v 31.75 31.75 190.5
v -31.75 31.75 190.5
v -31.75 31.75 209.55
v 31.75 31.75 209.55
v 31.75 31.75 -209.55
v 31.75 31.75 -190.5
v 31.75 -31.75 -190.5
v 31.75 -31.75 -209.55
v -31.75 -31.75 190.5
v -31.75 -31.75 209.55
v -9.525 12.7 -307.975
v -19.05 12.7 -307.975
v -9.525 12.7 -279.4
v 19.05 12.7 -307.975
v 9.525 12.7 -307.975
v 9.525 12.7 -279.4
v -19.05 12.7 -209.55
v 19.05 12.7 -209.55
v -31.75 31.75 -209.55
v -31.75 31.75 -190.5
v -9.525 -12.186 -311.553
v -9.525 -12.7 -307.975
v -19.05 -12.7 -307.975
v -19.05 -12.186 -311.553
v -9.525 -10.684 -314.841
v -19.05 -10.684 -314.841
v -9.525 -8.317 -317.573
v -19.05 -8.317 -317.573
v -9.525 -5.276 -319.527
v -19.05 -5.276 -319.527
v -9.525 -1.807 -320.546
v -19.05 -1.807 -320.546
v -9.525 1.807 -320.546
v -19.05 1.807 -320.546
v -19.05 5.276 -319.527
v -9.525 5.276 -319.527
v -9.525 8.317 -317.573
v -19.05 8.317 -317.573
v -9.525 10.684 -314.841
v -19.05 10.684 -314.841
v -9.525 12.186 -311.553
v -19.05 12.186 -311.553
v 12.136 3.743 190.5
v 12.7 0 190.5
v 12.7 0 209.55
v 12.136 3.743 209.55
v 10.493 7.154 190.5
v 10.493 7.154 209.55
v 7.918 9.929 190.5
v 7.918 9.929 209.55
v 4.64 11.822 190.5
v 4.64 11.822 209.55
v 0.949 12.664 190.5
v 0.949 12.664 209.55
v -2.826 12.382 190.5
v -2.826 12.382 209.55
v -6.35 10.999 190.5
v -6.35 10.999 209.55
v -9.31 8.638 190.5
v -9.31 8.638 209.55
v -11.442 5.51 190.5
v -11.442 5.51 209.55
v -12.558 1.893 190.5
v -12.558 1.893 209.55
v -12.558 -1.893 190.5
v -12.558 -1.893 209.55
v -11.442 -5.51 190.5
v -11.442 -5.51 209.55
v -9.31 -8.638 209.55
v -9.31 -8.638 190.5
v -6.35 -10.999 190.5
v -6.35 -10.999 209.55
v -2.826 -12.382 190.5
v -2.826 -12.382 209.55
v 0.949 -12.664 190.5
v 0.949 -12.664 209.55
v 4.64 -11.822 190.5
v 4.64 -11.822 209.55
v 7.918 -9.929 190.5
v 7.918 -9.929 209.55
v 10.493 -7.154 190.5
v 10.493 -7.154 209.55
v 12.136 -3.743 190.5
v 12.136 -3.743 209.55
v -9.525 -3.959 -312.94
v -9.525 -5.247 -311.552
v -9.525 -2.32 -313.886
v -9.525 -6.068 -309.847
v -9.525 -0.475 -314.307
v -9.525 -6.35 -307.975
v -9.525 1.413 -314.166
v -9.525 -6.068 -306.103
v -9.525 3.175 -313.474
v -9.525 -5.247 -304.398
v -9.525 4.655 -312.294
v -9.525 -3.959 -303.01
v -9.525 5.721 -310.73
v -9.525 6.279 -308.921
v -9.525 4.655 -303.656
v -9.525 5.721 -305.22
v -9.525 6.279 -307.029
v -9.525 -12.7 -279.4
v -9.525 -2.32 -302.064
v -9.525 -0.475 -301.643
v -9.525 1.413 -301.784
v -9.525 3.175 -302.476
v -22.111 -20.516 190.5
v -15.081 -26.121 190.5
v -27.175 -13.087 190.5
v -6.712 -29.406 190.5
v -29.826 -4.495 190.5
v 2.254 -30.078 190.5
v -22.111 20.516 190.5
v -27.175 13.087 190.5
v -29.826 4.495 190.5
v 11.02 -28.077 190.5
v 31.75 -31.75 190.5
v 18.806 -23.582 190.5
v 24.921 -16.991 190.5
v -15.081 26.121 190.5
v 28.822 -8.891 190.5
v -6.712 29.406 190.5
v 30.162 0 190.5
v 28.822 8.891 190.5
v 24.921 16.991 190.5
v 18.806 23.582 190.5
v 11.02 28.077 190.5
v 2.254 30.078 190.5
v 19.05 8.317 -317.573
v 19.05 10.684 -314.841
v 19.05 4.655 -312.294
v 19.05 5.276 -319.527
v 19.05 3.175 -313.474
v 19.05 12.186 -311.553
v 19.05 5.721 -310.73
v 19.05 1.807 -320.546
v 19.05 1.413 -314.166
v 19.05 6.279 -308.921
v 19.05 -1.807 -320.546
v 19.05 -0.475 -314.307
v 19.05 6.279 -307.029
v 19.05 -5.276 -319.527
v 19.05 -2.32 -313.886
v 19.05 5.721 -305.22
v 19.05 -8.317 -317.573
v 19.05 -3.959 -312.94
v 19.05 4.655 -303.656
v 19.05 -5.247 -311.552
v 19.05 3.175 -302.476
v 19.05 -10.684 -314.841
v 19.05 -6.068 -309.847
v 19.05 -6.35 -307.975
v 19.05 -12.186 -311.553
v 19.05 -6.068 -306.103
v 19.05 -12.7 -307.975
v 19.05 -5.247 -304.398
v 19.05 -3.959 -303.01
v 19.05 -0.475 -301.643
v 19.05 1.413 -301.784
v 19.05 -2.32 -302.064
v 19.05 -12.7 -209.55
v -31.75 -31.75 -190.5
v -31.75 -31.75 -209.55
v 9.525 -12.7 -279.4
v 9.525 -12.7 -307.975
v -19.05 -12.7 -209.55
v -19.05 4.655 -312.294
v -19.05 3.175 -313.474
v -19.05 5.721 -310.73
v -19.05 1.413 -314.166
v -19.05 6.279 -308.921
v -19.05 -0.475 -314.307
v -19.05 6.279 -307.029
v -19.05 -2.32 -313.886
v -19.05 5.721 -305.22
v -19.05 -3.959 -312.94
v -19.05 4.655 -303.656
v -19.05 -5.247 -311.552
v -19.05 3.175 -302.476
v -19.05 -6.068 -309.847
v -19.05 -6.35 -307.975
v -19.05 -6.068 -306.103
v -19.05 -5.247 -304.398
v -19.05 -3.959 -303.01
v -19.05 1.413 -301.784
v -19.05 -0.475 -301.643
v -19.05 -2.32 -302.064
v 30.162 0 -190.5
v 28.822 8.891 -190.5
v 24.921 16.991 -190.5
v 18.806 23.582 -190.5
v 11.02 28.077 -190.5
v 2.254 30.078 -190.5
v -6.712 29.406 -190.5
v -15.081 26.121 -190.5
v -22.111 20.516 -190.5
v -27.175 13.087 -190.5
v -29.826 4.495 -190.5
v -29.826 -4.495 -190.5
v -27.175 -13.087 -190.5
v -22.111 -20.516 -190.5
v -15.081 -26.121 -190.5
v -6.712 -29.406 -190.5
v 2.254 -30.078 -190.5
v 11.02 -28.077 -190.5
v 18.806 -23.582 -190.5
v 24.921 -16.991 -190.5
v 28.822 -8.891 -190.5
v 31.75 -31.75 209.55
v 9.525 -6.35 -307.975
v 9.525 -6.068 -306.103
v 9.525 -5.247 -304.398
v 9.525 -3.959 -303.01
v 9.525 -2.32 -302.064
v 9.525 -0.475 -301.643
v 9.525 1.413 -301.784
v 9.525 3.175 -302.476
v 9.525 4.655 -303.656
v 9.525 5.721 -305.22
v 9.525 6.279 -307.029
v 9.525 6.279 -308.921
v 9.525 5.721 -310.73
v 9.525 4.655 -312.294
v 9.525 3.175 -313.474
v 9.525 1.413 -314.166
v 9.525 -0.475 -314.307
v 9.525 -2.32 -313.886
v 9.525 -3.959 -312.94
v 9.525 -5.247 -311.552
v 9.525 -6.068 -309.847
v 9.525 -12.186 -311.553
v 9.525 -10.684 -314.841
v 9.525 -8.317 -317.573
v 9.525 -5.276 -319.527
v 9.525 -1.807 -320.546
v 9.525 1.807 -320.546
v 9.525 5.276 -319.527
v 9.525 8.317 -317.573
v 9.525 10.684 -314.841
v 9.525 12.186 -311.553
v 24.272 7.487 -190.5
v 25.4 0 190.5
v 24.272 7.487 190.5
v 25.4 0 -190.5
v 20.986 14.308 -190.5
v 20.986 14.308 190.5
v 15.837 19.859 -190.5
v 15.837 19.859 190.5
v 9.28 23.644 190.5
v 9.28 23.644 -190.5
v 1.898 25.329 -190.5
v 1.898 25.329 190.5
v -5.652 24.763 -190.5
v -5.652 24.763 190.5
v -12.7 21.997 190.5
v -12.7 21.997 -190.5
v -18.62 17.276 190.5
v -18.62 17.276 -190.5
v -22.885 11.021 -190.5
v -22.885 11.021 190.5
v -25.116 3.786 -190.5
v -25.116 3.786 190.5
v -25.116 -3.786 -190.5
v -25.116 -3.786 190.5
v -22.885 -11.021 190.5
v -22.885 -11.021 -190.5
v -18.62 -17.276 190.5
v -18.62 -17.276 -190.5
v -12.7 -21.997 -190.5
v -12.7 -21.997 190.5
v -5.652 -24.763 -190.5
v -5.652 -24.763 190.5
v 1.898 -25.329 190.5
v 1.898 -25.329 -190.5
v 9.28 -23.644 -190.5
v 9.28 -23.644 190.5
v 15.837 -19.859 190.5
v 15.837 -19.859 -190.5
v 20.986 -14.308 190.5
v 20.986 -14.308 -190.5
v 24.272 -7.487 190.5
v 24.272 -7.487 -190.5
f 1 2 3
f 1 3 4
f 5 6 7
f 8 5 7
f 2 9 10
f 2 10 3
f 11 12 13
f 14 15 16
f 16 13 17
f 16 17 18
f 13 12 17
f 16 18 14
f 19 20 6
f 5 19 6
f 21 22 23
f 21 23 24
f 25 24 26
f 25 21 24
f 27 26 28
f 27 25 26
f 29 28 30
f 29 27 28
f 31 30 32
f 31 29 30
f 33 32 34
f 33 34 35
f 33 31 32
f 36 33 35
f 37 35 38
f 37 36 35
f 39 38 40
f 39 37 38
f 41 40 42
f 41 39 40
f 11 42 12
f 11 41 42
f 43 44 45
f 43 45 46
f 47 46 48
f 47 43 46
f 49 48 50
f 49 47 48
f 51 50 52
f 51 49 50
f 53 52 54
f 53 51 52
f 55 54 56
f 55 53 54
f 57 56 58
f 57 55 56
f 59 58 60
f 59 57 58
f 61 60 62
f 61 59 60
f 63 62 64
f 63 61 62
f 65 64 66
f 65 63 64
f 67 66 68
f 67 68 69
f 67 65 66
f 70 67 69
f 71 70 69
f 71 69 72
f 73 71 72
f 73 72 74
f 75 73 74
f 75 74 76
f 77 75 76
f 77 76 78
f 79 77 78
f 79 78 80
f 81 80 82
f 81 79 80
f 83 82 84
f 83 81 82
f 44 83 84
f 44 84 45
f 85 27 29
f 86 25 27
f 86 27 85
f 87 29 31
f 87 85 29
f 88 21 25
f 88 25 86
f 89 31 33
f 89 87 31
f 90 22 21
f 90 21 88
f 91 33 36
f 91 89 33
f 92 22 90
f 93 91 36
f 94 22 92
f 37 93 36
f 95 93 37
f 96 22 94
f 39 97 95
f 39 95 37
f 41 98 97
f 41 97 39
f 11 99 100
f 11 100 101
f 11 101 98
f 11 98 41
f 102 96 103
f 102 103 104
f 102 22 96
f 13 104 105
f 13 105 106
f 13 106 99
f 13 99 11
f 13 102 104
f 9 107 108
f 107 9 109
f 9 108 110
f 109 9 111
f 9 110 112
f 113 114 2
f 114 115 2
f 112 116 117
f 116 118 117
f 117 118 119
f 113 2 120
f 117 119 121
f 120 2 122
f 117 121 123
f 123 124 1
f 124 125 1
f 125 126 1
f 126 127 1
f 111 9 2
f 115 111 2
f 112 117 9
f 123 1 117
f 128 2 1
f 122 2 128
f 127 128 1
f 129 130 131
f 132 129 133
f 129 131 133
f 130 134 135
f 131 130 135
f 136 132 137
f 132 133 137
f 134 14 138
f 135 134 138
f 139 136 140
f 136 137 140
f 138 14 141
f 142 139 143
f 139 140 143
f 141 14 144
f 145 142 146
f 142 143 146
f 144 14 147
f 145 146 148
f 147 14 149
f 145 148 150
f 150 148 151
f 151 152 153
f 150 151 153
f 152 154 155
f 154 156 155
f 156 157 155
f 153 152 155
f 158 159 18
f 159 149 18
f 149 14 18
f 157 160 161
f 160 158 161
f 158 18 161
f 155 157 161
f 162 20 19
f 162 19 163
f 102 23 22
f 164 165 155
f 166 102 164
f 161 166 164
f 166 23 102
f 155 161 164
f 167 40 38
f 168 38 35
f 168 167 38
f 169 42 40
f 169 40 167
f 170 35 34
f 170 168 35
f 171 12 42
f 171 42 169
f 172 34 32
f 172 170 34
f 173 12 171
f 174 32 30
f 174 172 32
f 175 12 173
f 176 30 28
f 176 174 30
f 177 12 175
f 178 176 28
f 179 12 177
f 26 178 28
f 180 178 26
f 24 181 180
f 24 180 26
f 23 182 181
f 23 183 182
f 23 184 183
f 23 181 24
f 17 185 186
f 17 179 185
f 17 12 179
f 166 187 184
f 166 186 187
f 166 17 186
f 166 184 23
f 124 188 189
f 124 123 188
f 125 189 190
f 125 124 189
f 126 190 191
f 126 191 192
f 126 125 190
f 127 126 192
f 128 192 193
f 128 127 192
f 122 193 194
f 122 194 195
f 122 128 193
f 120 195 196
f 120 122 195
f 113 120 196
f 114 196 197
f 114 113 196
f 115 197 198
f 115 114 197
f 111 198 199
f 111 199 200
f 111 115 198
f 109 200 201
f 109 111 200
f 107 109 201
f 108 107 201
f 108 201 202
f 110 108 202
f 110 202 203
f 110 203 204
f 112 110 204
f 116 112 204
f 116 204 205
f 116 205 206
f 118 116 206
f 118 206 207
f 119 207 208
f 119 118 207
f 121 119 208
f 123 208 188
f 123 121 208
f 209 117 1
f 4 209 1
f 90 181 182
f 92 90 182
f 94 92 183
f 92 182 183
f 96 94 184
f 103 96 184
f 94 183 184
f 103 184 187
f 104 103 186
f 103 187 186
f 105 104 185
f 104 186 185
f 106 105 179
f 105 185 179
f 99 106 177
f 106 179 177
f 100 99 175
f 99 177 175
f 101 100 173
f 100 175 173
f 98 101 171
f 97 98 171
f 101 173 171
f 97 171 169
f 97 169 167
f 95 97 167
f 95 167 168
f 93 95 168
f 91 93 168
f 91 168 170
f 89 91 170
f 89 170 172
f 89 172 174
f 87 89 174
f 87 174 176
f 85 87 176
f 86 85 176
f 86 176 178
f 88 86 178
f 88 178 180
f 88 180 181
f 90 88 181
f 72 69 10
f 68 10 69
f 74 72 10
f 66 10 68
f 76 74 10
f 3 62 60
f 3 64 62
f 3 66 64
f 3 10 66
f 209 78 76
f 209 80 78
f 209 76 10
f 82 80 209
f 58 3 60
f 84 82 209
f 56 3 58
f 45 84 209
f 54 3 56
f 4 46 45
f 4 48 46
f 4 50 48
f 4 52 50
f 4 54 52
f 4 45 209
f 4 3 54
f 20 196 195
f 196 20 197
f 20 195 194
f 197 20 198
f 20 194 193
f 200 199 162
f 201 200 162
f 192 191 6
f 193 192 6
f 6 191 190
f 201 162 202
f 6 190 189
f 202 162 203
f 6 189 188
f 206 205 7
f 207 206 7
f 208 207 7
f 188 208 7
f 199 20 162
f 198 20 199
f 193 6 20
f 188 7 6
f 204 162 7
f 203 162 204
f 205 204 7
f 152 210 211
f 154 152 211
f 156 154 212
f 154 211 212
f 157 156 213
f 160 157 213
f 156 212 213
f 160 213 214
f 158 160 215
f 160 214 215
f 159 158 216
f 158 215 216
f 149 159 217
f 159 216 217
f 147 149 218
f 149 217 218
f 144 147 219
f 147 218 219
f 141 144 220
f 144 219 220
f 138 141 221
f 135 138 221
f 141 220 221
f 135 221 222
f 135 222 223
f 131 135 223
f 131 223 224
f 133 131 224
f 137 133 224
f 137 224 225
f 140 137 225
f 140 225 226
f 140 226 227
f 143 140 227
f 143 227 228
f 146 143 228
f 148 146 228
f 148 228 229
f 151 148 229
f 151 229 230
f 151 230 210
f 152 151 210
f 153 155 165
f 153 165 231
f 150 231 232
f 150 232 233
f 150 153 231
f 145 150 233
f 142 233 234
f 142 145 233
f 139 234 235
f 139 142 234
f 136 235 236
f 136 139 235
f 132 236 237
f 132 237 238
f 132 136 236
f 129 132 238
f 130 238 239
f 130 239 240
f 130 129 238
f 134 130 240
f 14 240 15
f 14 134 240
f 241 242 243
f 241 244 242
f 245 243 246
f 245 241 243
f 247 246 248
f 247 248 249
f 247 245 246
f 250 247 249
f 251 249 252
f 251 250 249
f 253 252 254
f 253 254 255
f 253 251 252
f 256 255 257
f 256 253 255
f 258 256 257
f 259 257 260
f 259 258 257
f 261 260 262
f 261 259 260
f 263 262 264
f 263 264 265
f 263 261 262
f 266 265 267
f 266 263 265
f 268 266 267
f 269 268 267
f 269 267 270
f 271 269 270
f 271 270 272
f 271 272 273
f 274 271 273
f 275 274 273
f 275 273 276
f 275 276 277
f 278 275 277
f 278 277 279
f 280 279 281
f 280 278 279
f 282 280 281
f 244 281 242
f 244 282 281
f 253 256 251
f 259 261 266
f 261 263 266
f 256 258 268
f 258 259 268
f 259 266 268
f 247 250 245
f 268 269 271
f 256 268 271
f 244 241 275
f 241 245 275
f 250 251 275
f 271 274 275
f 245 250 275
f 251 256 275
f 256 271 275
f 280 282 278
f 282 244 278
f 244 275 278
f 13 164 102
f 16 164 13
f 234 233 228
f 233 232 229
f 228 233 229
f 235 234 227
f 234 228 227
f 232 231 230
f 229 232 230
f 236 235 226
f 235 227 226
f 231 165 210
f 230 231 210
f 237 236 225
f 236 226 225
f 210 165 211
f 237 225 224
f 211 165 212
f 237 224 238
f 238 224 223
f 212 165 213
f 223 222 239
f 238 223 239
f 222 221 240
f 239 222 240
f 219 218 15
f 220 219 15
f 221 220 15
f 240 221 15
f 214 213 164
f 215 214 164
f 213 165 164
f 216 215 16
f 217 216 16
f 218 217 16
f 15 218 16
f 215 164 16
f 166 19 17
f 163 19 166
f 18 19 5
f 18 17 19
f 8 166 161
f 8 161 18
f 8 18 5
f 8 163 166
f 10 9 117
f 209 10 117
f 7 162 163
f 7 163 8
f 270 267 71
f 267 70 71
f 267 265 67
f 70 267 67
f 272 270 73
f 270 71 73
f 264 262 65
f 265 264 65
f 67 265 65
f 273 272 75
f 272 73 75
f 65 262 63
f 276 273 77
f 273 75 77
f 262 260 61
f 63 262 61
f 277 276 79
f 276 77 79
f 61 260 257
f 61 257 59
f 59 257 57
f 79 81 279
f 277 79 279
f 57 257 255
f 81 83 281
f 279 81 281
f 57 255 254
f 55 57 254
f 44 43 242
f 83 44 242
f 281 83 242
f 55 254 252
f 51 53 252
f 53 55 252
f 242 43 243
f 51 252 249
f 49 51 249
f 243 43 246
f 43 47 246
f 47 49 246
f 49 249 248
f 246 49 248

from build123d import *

# Parameters (mm, degrees)
F0_R      = 30.1625
F0_R_2    = 25.4
F1_DEPTH  = 190.5
F3_W      = 63.5
F3_H      = 63.5
F3_R      = 12.7
F4_DEPTH  = 19.05
F6_W      = 63.5
F6_H      = 63.5
F7_DEPTH  = 19.05
F8_W      = 38.1
F8_H      = 25.4
F9_DEPTH  = 98.425
F10_W     = 38.1
F10_H     = 12.7
F13_D     = 12.7
F14_W     = 55.815736
F14_H     = 42.682048
F15_DEPTH = 9.525


with BuildPart() as f1:
    # F0 (on Top) → F1 (new body, symmetric)
    with BuildSketch(Plane.XY):
        Circle(F0_R)
        Circle(F0_R_2, mode=Mode.SUBTRACT)
    extrude(amount=F1_DEPTH, both=True)

    # F3 (on offset) → F4 (join)
    with BuildSketch(Plane.XY.offset(190.5)):
        Rectangle(F3_W, F3_H)
        Circle(F3_R, mode=Mode.SUBTRACT)
    extrude(amount=F4_DEPTH)

    # F6 (on offset) → F7 (join)
    with BuildSketch(Plane(origin=(0, 0, -190.5), x_dir=(1, 0, 0), z_dir=(0, 0, -1))):
        Rectangle(F6_W, F6_H)
    extrude(amount=F7_DEPTH)

    # F8 (on face) → F9 (join)
    with BuildSketch(Plane(origin=(0, 0, -209.55), x_dir=(1, 0, 0), z_dir=(0, 0, -1))):
        Rectangle(F8_W, F8_H)
    extrude(amount=F9_DEPTH)

    # F10 (on face) → F11 (revolve)
    with BuildSketch(Plane(origin=(0, 0, -307.975), x_dir=(1, 0, 0), z_dir=(0, 0, -1))):
        with Locations((0, 6.35)):
            Rectangle(F10_W, F10_H)
    revolve(axis=Axis((0, 0, -307.975), (1, 0, 0)))

    # F13 (through all)
    with Locations(Plane.YZ.offset(19.05)):
        with Locations((0, -307.975)):
            Hole(F13_D / 2)

    # F14 (on Right) → F15 (cut, symmetric)
    with BuildSketch(Plane.YZ):
        with Locations((-0.949135, -300.741024)):
            Rectangle(F14_W, F14_H)
    extrude(amount=F15_DEPTH, both=True, mode=Mode.SUBTRACT)


solid = f1.part
